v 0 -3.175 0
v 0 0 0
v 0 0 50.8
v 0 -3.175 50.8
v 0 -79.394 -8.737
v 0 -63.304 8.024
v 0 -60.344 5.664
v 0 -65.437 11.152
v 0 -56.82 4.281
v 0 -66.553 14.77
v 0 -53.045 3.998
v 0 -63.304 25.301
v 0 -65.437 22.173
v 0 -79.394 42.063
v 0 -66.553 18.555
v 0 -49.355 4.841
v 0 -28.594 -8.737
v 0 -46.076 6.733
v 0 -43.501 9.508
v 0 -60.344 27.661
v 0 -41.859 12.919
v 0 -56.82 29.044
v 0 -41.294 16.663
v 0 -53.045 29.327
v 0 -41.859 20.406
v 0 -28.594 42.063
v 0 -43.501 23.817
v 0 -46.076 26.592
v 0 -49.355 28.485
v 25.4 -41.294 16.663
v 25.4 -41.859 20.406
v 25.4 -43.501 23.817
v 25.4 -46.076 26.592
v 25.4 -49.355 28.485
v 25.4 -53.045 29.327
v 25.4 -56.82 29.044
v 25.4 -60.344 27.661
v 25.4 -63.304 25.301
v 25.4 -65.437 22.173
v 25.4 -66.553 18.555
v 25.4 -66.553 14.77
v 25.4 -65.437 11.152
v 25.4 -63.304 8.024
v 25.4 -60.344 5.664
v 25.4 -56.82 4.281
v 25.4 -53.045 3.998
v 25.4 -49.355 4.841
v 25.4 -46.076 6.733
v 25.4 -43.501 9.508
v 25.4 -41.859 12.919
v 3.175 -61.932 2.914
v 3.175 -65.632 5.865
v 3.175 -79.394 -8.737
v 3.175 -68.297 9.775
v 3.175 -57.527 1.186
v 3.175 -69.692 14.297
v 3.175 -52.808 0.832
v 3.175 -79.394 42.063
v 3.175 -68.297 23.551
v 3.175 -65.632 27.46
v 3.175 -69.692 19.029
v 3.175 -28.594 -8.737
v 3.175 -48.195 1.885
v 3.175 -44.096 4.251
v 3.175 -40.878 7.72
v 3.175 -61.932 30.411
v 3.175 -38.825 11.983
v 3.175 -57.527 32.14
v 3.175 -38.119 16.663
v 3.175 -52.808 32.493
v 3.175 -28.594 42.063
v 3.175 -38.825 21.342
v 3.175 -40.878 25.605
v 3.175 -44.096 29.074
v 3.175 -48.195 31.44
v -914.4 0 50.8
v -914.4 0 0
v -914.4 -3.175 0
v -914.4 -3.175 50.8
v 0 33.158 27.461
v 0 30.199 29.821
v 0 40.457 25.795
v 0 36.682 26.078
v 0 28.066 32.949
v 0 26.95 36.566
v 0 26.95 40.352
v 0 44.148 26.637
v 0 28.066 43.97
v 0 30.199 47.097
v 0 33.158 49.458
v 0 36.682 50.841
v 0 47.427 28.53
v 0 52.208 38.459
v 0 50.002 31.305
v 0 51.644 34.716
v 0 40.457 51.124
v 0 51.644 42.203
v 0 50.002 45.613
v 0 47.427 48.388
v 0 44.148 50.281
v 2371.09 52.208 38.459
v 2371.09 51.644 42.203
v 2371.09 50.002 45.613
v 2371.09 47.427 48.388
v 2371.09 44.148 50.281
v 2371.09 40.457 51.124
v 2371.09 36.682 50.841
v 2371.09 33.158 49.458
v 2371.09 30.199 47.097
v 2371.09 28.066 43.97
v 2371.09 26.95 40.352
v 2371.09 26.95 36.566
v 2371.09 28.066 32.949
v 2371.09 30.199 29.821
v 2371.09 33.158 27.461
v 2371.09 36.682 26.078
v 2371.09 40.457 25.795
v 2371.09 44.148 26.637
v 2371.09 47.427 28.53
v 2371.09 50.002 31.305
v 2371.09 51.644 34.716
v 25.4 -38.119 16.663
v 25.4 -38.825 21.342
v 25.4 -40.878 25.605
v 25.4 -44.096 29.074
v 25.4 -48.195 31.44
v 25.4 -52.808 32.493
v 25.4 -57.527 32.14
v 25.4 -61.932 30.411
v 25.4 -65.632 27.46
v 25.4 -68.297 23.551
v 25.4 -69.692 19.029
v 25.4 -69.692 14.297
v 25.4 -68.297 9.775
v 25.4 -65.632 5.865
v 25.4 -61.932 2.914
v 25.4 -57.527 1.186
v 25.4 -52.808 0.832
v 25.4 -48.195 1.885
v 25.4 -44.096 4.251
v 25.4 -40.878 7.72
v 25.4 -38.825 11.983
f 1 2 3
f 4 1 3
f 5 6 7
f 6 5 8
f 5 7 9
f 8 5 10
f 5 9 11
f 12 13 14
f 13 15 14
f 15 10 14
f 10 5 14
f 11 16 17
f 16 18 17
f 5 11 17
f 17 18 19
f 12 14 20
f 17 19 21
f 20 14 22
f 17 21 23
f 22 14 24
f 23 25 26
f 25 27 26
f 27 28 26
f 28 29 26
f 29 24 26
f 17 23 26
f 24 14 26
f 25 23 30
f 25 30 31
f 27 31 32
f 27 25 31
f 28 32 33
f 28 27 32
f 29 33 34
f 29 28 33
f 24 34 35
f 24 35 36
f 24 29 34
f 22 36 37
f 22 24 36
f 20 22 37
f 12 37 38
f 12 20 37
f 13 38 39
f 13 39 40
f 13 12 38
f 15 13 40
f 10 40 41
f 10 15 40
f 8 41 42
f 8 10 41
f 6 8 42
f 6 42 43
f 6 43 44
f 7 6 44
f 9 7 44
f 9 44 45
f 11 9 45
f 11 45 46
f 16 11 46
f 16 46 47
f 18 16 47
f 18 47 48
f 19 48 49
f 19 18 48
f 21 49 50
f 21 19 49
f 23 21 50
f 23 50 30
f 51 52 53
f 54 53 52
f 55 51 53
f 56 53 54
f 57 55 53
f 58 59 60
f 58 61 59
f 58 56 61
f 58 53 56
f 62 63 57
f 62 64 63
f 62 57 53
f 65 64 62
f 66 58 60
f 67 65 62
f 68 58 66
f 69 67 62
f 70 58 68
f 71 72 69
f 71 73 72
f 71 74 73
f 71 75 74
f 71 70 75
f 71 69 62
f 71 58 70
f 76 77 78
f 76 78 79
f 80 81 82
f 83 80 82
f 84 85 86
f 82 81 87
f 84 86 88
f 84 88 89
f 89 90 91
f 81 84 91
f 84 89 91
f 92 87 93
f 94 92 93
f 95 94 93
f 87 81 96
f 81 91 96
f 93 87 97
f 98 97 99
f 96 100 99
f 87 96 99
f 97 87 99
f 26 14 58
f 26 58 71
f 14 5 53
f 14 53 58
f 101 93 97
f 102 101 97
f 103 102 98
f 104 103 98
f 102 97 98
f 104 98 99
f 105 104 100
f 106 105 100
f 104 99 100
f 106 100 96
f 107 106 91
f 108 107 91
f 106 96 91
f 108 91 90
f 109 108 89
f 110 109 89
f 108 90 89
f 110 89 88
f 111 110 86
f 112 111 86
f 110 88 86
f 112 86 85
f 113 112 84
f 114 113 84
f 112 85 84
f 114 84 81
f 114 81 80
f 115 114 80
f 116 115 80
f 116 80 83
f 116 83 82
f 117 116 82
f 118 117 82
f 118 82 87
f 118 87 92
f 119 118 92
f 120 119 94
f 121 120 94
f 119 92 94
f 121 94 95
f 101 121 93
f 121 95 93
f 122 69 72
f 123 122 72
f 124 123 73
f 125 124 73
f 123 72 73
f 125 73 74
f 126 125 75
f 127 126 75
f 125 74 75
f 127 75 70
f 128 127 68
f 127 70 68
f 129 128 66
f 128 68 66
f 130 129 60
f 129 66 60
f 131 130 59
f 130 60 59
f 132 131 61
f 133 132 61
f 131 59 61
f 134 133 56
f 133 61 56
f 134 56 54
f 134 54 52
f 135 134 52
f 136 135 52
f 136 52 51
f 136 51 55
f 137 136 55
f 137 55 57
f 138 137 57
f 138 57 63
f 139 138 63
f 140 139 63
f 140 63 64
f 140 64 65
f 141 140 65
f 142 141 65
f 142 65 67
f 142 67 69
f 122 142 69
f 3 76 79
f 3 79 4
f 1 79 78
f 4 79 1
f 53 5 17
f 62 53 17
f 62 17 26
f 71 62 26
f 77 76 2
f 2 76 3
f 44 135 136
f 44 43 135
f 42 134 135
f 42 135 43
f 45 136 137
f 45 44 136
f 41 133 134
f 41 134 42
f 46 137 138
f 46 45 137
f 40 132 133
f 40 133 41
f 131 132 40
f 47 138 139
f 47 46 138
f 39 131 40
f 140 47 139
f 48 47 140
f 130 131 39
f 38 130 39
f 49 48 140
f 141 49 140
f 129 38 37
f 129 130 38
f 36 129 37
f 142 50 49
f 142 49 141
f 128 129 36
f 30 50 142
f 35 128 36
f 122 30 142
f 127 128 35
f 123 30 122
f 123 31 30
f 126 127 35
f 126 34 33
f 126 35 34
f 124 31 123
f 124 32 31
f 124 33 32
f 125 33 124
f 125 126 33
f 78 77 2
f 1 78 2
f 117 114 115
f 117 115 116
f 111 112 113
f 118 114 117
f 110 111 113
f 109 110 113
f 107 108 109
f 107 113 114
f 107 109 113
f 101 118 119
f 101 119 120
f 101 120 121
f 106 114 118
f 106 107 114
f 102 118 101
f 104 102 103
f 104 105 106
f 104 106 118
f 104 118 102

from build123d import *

# Parameters (mm, degrees)
F0_W     = 914.4
F0_H     = 50.8
F1_DEPTH = 3.175
F2_W     = 50.8
F2_H     = 50.8
F2_R     = 15.875
F3_DEPTH = 3.175
F2_R_2   = 12.7
F4_DEPTH = 25.4
F5_R     = 12.7
F6_DEPTH = 2371.09


with BuildPart() as f1:
    # F0 (on Front) → F1 (new body)
    with BuildSketch(Plane.XZ):
        with Locations((-457.2, 25.4)):
            Rectangle(F0_W, F0_H)
    extrude(amount=F1_DEPTH)


with BuildPart() as f3:
    # F2 (on Right) → F3 (new body)
    with BuildSketch(Plane.YZ):
        with Locations((-53.99437, 16.662638)):
            Rectangle(F2_W, F2_H)
        with Locations((-53.99437, 16.662638)):
            Circle(F2_R, mode=Mode.SUBTRACT)
    extrude(amount=F3_DEPTH)

    # F2 (on Right) → F4 (join)
    with BuildSketch(Plane.YZ):
        with Locations((-53.99437, 16.662638)):
            Circle(F2_R)
        with Locations((-53.99437, 16.662638)):
            Circle(F2_R_2, mode=Mode.SUBTRACT)
    extrude(amount=F4_DEPTH)


with BuildPart() as f6:
    # F5 (on Right) → F6 (new body)
    with BuildSketch(Plane.YZ):
        with Locations((39.508425, 38.45923)):
            Circle(F5_R)
    extrude(amount=F6_DEPTH)


solid = Compound([f1.part, f3.part, f6.part])
